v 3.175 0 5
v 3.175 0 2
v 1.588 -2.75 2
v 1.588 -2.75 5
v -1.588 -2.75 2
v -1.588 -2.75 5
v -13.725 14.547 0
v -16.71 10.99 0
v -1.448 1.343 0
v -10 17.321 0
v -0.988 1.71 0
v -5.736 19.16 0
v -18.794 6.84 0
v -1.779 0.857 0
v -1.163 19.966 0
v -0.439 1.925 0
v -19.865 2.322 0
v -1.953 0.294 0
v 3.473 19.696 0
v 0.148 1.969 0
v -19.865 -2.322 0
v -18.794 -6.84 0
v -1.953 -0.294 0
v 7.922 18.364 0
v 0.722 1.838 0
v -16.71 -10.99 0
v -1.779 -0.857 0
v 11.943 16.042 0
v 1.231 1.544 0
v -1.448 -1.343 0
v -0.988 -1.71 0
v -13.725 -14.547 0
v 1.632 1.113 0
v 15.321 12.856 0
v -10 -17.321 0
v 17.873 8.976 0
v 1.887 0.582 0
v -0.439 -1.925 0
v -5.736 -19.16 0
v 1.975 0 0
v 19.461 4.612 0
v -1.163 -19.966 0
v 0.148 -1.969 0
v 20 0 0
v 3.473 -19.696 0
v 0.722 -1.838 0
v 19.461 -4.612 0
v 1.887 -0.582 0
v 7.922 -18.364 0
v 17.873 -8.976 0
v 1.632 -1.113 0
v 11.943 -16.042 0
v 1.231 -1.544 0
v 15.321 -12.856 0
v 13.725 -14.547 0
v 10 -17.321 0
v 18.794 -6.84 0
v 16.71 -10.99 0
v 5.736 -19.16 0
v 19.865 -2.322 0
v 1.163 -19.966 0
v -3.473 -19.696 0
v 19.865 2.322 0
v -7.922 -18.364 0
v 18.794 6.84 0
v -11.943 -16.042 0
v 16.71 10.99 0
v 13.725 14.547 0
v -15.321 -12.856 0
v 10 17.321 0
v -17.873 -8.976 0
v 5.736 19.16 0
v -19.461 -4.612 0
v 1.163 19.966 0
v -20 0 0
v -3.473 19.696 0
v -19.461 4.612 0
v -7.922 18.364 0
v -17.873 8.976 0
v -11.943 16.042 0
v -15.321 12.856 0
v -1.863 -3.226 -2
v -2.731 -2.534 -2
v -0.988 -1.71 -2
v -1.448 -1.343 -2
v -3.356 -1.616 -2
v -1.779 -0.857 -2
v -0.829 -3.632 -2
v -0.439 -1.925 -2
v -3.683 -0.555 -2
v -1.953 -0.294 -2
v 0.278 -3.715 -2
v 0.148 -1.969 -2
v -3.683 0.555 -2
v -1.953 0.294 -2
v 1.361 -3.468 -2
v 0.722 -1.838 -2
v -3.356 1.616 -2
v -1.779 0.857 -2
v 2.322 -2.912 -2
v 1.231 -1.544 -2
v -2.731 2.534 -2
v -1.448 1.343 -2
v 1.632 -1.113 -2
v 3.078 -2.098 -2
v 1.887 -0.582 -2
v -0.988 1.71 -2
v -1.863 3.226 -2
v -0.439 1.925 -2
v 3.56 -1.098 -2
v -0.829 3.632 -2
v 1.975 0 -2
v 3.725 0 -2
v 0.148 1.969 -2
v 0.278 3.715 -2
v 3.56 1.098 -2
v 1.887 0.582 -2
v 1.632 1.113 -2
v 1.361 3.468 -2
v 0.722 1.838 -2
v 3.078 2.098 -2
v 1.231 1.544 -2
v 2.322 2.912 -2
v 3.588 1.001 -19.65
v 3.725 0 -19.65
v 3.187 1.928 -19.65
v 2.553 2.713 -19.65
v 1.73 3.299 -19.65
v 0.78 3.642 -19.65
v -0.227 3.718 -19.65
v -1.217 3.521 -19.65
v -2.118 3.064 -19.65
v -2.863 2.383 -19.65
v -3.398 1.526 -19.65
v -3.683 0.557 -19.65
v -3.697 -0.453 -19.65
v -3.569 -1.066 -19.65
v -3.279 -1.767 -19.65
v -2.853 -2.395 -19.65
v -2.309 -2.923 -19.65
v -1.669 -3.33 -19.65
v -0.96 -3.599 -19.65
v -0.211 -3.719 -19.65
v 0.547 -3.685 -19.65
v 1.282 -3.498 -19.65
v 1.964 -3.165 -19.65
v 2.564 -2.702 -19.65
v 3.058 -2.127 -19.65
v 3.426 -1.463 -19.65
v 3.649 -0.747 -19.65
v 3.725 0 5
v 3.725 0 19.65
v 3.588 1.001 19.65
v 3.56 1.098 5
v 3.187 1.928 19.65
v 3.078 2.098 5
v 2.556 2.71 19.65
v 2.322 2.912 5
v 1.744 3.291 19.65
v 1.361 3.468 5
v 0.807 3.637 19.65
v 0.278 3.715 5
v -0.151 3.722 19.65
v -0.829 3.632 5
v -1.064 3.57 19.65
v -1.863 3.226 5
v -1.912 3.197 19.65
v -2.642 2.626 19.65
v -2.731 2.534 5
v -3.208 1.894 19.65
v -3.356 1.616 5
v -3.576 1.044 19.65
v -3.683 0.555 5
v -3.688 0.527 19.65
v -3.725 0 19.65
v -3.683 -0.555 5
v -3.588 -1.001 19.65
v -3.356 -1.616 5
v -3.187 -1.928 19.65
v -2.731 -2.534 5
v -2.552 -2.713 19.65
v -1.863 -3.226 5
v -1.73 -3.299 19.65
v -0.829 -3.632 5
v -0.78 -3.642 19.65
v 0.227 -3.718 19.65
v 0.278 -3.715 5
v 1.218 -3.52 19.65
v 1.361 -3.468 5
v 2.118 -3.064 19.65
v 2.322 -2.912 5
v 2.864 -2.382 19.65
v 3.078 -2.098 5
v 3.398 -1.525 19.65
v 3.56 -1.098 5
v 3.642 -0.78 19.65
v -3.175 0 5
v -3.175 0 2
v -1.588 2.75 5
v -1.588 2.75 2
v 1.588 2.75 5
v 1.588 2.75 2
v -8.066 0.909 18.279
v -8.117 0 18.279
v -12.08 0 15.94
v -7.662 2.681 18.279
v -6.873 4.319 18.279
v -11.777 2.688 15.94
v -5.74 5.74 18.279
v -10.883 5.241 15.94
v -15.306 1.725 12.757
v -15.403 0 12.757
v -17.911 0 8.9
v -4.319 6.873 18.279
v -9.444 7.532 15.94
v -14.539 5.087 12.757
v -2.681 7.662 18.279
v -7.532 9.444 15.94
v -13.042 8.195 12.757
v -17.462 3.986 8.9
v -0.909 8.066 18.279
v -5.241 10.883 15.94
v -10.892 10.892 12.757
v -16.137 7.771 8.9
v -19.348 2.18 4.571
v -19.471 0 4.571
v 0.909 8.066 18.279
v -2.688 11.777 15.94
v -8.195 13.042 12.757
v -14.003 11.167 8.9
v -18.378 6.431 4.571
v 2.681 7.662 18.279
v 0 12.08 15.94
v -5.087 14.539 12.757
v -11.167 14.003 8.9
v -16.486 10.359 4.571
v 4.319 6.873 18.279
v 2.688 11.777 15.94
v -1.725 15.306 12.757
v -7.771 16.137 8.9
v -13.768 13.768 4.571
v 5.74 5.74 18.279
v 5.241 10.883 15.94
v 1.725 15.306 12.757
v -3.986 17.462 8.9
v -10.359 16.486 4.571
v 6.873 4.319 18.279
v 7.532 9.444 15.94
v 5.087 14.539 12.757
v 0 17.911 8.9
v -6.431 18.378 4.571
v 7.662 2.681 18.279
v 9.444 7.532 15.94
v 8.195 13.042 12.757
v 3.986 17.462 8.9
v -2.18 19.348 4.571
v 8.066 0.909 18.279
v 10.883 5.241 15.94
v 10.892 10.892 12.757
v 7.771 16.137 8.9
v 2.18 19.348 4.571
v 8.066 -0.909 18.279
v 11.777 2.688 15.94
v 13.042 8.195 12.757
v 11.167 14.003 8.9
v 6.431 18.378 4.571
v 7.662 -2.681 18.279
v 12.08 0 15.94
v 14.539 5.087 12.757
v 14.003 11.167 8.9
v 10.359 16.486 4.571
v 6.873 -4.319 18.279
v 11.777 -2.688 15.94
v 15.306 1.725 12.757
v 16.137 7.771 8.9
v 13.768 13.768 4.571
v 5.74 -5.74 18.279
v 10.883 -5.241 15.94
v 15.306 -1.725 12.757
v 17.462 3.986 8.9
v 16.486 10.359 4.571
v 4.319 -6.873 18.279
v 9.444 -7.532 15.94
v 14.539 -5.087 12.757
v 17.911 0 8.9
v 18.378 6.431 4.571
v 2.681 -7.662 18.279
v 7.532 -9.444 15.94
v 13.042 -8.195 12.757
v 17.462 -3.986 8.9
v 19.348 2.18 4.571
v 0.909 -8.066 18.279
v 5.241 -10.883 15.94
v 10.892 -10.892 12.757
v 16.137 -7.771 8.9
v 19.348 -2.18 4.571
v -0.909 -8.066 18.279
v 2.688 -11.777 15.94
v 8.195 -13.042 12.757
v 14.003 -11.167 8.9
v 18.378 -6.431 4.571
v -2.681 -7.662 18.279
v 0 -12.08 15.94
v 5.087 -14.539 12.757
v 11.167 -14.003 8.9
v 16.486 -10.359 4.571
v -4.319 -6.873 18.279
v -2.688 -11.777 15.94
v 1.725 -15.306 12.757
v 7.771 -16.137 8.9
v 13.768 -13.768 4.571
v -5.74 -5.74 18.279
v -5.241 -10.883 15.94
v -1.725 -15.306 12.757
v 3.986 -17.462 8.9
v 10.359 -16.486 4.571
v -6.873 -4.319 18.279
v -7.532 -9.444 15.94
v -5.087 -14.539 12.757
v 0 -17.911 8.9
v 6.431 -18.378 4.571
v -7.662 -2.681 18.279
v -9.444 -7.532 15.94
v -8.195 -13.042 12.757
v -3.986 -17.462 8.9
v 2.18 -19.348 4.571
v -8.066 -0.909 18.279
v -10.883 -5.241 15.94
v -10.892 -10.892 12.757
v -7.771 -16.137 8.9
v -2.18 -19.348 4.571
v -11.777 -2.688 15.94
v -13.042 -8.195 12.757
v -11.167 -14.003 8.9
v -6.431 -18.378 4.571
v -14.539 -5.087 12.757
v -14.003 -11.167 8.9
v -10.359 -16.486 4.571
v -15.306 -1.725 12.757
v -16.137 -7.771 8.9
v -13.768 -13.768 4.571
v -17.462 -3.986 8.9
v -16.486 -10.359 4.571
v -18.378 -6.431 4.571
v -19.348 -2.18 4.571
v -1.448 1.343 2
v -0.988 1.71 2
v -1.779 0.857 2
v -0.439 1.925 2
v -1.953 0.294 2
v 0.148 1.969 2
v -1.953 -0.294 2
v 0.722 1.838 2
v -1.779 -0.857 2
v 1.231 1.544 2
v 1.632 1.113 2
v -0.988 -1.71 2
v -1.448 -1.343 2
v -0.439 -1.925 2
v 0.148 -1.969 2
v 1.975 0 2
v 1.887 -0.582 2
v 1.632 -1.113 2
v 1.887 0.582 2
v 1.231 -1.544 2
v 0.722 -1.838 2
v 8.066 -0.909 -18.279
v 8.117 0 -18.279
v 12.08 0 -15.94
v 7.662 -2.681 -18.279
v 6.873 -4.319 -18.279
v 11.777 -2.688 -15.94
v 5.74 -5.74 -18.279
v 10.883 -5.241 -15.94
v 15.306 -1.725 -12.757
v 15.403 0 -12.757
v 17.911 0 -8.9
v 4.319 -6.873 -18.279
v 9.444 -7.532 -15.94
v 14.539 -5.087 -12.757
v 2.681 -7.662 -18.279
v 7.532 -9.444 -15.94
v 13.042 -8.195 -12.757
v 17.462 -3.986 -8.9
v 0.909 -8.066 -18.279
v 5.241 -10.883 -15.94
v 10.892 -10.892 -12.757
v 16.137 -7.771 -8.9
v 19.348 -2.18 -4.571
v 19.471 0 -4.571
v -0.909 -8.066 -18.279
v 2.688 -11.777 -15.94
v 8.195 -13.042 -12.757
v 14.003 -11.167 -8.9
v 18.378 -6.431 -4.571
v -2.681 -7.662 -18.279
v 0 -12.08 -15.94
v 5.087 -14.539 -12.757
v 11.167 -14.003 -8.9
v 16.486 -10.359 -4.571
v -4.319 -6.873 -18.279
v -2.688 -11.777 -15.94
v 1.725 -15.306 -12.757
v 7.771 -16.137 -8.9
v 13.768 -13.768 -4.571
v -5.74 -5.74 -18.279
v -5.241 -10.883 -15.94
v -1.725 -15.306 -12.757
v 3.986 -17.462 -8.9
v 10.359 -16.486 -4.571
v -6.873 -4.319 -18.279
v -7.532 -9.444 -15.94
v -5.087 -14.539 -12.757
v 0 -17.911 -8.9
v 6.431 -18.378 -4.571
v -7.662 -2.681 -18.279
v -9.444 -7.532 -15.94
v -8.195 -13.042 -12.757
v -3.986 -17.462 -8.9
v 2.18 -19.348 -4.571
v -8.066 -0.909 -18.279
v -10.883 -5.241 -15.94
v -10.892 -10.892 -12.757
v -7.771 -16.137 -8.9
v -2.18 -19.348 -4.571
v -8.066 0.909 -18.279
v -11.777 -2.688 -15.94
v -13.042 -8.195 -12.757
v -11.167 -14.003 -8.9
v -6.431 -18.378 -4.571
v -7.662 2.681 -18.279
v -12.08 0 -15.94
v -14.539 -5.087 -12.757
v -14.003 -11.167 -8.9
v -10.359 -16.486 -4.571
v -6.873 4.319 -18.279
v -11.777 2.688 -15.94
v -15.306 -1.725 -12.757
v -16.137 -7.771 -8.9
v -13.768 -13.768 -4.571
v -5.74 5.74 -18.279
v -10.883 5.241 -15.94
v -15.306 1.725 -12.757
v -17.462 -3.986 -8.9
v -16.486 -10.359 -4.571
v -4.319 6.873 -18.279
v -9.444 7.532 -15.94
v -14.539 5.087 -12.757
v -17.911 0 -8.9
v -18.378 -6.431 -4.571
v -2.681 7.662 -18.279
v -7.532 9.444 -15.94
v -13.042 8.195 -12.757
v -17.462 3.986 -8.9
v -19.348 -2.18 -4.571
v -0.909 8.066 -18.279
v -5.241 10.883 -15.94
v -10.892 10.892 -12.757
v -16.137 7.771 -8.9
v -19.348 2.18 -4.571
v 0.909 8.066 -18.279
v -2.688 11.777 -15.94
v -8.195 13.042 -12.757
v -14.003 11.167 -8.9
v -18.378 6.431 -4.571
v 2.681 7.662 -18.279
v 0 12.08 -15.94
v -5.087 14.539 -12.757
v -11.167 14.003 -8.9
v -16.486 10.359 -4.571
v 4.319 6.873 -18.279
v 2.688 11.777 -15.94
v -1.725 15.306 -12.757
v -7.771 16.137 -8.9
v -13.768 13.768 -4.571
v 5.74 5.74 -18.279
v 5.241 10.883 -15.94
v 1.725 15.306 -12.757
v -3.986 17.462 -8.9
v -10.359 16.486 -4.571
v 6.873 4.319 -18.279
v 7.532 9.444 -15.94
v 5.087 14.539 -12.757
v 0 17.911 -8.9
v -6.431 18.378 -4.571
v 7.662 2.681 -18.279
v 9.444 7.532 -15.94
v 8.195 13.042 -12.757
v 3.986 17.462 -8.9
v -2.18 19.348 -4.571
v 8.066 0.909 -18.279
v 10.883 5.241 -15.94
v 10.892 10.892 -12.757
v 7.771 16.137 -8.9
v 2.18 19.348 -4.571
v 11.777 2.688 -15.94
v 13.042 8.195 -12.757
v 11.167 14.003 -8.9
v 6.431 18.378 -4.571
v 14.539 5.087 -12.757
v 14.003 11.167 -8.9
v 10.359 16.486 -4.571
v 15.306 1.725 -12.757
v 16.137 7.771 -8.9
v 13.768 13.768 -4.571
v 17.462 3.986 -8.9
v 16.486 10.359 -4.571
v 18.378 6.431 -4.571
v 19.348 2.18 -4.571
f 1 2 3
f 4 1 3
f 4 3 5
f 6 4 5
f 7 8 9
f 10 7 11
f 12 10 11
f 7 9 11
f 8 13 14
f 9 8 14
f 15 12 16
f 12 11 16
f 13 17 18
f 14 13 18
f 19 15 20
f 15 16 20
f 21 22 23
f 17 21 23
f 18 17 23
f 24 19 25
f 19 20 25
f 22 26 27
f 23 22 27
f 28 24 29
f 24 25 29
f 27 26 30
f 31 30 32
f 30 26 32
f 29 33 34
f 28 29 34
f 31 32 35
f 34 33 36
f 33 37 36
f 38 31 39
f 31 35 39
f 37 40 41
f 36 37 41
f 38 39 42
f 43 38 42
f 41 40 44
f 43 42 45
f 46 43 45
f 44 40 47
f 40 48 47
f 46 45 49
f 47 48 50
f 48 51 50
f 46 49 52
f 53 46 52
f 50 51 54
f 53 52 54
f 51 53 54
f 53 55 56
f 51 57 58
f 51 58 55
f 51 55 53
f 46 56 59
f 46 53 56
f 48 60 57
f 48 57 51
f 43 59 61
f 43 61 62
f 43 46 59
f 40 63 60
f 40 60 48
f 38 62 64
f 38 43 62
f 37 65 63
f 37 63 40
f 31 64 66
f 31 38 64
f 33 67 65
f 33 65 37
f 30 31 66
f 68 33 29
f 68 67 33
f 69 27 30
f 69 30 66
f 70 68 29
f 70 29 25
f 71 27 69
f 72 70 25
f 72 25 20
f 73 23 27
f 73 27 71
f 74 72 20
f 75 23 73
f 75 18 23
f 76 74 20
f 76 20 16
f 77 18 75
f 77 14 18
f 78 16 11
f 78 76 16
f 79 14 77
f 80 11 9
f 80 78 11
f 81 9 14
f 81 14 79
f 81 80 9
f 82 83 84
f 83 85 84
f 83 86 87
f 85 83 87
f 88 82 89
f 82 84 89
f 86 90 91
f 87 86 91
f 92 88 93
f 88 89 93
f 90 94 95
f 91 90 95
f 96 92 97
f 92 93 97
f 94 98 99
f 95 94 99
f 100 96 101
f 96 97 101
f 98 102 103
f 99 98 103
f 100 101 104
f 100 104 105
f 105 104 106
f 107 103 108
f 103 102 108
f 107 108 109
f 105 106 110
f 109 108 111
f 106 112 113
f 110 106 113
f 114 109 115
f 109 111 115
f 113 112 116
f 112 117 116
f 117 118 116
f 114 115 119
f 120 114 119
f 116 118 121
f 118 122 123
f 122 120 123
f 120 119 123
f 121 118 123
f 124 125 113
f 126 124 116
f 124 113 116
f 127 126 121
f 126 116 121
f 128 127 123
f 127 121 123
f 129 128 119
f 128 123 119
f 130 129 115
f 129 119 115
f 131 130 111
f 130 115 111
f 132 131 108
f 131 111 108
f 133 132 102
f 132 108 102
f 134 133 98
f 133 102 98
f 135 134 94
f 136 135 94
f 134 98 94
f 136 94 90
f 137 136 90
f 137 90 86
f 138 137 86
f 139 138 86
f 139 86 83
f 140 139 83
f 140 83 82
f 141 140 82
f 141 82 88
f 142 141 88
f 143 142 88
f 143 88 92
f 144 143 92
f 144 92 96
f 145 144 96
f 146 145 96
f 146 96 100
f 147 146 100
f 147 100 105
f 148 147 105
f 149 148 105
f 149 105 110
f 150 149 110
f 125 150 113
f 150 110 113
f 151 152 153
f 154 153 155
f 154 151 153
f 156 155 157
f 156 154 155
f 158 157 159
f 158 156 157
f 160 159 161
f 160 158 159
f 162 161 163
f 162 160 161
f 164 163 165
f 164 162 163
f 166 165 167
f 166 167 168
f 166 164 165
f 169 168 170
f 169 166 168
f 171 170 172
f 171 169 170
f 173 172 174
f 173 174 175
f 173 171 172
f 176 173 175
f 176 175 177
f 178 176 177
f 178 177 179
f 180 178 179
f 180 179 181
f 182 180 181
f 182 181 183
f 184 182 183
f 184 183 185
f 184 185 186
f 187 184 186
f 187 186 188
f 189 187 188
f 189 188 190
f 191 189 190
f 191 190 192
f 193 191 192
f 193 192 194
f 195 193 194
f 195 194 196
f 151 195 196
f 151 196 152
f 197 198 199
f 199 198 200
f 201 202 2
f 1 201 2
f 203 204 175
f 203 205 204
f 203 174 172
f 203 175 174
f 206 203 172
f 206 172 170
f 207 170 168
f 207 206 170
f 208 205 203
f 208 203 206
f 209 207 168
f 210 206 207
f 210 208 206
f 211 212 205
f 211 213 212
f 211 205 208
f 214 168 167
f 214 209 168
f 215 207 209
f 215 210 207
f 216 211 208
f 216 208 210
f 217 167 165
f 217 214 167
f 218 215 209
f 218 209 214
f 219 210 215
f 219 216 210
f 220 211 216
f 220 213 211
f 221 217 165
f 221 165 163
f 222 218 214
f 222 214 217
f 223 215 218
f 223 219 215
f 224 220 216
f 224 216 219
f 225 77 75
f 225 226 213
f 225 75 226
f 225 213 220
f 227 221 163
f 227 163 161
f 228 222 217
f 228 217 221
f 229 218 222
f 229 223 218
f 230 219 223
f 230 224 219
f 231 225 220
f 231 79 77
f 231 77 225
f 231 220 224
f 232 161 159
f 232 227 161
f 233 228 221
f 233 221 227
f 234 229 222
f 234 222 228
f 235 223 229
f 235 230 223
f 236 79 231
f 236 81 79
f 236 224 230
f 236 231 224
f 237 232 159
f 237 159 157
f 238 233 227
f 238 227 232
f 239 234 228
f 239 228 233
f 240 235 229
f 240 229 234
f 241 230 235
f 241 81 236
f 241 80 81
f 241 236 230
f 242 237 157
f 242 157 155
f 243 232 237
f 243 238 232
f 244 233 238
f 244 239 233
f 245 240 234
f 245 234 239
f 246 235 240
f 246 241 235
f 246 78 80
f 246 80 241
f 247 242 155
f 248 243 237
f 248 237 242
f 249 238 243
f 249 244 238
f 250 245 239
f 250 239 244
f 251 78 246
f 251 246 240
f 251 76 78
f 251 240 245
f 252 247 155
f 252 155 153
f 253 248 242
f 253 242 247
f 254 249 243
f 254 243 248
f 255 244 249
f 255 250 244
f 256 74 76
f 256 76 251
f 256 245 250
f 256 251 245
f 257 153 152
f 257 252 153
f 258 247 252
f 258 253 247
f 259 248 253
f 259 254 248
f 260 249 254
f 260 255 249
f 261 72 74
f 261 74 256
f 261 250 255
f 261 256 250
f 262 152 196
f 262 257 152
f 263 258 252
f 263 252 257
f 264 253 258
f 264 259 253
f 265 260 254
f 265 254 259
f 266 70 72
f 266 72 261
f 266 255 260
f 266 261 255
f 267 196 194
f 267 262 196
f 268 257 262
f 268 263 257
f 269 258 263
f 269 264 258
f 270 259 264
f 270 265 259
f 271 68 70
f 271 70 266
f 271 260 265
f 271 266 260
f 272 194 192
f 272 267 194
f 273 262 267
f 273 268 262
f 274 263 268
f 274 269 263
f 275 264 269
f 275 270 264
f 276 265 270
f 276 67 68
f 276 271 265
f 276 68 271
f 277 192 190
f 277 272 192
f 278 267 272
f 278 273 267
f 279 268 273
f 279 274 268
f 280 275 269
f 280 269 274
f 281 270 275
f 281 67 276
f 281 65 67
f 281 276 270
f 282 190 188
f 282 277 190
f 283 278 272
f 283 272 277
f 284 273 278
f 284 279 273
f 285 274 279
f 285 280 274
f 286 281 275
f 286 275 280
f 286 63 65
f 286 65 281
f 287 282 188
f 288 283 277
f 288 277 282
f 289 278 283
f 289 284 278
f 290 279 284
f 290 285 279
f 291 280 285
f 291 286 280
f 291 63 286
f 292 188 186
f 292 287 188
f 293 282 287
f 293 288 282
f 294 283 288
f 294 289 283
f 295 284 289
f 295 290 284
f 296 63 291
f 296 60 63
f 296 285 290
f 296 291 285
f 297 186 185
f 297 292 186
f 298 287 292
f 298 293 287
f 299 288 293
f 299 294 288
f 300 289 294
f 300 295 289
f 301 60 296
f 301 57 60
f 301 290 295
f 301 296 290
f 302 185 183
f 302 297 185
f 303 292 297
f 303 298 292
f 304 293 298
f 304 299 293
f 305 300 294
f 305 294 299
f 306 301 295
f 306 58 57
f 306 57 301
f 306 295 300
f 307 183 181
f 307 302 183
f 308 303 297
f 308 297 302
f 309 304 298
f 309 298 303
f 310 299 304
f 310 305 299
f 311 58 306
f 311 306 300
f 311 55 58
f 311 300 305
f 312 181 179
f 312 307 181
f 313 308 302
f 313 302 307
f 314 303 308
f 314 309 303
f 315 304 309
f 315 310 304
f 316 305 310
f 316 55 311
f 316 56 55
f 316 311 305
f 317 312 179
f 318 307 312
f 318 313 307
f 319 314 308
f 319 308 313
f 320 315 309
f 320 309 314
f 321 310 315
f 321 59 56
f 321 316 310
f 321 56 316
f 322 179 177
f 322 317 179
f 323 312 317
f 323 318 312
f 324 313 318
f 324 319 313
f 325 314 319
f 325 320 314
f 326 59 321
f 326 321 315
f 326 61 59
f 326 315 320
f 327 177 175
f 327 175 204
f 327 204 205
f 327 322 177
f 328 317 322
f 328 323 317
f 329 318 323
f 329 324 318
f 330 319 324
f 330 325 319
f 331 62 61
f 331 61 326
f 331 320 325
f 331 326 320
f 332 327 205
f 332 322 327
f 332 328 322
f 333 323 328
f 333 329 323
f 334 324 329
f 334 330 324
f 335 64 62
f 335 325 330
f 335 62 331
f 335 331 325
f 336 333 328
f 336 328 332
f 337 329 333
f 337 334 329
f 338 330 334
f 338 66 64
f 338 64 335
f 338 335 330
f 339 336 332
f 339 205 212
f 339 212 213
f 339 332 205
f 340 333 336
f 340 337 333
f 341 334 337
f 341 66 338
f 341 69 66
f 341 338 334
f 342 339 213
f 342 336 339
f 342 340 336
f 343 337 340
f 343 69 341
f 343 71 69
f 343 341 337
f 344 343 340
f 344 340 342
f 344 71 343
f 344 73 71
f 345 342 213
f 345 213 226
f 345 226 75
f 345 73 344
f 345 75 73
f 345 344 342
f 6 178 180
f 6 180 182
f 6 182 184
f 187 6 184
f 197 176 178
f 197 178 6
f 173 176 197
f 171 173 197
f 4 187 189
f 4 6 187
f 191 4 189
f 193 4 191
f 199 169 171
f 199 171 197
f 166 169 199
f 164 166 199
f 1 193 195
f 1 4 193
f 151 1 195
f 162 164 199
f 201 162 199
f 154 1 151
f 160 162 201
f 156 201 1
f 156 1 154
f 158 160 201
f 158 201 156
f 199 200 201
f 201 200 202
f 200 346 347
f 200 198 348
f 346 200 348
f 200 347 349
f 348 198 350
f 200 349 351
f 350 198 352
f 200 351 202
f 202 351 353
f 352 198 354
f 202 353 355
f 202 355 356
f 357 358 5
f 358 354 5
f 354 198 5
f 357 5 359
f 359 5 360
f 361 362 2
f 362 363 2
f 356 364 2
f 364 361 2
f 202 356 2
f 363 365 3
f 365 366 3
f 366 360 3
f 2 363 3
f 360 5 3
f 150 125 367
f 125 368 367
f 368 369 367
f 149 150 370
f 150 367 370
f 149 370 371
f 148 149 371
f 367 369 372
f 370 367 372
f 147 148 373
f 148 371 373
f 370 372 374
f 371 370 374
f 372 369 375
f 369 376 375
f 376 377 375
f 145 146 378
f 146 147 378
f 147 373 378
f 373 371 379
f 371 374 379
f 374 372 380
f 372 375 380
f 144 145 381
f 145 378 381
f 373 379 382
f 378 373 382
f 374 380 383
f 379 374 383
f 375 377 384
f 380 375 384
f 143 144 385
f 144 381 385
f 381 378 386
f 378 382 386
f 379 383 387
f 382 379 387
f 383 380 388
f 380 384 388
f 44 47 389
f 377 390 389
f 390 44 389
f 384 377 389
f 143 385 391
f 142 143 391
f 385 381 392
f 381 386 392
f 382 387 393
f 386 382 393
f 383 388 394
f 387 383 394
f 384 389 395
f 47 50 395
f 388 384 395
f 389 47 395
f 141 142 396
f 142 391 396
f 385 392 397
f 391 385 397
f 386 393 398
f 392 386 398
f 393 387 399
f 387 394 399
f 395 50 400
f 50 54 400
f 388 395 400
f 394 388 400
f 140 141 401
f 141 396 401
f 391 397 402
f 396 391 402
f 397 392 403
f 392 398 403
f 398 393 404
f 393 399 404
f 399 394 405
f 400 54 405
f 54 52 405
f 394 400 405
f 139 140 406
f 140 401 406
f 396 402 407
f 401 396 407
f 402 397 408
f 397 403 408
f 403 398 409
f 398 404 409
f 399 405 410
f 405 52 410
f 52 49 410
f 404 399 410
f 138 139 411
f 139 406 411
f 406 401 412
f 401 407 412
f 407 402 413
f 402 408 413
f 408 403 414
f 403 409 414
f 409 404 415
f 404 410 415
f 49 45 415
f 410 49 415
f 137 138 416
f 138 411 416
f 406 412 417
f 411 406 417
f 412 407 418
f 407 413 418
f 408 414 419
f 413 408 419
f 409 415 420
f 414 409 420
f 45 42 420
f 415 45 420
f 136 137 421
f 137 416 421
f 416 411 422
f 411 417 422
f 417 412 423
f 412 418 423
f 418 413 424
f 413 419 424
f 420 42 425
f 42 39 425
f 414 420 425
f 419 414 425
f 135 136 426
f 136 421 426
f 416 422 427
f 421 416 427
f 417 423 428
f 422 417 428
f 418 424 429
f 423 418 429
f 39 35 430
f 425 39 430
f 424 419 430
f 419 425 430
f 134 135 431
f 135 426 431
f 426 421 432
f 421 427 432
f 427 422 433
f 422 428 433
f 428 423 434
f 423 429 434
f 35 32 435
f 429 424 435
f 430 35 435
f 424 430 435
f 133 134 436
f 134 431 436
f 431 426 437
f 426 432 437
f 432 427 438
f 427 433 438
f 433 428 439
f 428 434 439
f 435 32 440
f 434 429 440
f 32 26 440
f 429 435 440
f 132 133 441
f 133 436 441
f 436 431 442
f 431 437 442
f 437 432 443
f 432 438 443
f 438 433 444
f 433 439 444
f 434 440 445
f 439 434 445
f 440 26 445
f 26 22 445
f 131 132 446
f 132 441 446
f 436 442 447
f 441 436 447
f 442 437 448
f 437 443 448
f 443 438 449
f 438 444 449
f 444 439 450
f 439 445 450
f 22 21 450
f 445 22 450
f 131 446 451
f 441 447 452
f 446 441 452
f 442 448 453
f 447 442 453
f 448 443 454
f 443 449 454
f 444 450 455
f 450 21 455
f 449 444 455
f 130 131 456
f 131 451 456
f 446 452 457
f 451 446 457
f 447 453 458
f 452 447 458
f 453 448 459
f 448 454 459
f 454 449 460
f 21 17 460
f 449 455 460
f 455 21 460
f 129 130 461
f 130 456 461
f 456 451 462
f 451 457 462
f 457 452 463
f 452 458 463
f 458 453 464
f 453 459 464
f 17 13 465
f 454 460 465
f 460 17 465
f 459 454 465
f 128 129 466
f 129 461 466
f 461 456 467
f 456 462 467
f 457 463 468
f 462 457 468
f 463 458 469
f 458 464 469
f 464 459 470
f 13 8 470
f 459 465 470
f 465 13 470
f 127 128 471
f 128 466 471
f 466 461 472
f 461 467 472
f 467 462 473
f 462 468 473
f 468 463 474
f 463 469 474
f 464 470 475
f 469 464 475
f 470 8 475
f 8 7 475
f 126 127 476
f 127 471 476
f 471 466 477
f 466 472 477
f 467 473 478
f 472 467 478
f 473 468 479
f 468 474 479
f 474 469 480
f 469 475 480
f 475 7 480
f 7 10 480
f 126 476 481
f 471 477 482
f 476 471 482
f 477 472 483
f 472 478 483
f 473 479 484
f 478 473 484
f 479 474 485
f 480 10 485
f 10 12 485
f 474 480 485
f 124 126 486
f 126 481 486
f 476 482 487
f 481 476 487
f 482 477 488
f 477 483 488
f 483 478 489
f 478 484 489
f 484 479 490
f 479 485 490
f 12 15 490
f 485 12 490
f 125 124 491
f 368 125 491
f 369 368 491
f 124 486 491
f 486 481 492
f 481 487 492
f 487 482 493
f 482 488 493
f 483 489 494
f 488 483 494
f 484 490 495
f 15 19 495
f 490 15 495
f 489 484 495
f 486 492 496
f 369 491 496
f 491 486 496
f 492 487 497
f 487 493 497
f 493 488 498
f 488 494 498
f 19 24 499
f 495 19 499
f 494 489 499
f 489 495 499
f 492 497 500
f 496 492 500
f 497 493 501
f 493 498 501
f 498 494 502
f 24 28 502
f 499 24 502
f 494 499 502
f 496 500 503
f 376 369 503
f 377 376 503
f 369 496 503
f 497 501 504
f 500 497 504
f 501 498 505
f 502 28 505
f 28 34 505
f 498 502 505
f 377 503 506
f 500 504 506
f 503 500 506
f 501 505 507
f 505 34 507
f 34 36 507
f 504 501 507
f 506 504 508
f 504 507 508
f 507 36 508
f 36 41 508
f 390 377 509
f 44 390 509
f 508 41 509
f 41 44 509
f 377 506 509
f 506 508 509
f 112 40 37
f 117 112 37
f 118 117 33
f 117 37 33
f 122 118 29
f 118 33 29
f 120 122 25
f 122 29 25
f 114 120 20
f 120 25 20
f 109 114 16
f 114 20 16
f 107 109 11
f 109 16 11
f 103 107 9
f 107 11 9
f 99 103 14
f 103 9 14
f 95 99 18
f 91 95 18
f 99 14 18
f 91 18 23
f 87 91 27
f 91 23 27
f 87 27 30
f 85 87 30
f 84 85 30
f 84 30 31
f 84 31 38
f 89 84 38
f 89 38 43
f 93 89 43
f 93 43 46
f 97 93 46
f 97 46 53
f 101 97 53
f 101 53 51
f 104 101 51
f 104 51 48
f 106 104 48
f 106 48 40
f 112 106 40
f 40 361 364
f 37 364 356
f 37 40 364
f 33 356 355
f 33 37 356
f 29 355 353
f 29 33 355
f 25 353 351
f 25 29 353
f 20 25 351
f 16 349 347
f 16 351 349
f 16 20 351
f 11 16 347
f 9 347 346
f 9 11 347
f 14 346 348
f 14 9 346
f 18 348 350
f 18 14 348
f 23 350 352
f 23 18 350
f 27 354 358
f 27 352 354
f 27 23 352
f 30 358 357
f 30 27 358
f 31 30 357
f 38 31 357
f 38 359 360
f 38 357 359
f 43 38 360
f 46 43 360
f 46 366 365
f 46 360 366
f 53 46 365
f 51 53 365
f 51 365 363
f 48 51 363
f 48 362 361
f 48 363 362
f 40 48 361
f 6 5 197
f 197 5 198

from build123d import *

# Parameters (mm, degrees)
F4_START      = -2
F4_DEPTH      = 23
F6_START      = -2
F5_R          = 3.725
F6_DEPTH      = 23
F7_R          = 1.975
F8_DEPTH      = 25
F8_DEPTH_BACK = 25
F9_START      = 5
F9_DEPTH      = 29.2


with BuildPart() as f1:
    # F0 (on Front) → F1 (revolve)
    with BuildSketch(Plane.XZ):
        with BuildLine():
            Line((0, 0), (0, 20))
            ThreePointArc((0, 20), (-14.1421356237, 14.1421356237), (-20, 0))
            Line((-20, 0), (0, 0))
        make_face()
    revolve(axis=Axis((0, 0, 0), (0, 0, -1)))

    # F3 (on face) → F4 (cut)
    with BuildSketch(Plane(origin=(0, 0, 0), x_dir=(1, 0, 0), z_dir=(0, 0, -1)).offset(F4_START)):
        Polygon((1.5877132403, 2.75), (-1.5877132403, 2.75), (-3.1754264805, 0), (-1.5877132403, -2.75), (1.5877132403, -2.75), (3.1754264805, 0), align=None)
    extrude(amount=-F4_DEPTH, mode=Mode.SUBTRACT)


with BuildPart() as f2:
    # F0 (on Front) → F2 (revolve)
    with BuildSketch(Plane.XZ):
        with BuildLine():
            ThreePointArc((0, -20), (14.1421356237, -14.1421356237), (20, 0))
            Line((20, 0), (0, 0))
            Line((0, 0), (0, -20))
        make_face()
    revolve(axis=Axis((0, 0, 0), (0, 0, -1)))

    # F5 (on face) → F6 (cut)
    with BuildSketch(Plane.XY.offset(F6_START)):
        Circle(F5_R)
    extrude(amount=-F6_DEPTH, mode=Mode.SUBTRACT)


with BuildPart() as f8_tool:
    # F7 (on Top) → F8 (new body, two sides)
    with BuildSketch(Plane.XY) as f8_sk:
        Circle(F7_R)
    extrude(amount=-F8_DEPTH)
    extrude(f8_sk.sketch, amount=F8_DEPTH_BACK)


with BuildPart() as f1_1:
    add(f1.part)

    # F8: cut by f8_tool
    add(f8_tool.part, mode=Mode.SUBTRACT)

    # F5 (on face) → F9 (cut)
    with BuildSketch(Plane.XY.offset(F9_START)):
        Circle(F5_R)
    extrude(amount=F9_DEPTH, mode=Mode.SUBTRACT)


with BuildPart() as f2_1:
    add(f2.part)

    # F8: cut by f8_tool
    add(f8_tool.part, mode=Mode.SUBTRACT)


solid = Compound([f1_1.part, f2_1.part])
